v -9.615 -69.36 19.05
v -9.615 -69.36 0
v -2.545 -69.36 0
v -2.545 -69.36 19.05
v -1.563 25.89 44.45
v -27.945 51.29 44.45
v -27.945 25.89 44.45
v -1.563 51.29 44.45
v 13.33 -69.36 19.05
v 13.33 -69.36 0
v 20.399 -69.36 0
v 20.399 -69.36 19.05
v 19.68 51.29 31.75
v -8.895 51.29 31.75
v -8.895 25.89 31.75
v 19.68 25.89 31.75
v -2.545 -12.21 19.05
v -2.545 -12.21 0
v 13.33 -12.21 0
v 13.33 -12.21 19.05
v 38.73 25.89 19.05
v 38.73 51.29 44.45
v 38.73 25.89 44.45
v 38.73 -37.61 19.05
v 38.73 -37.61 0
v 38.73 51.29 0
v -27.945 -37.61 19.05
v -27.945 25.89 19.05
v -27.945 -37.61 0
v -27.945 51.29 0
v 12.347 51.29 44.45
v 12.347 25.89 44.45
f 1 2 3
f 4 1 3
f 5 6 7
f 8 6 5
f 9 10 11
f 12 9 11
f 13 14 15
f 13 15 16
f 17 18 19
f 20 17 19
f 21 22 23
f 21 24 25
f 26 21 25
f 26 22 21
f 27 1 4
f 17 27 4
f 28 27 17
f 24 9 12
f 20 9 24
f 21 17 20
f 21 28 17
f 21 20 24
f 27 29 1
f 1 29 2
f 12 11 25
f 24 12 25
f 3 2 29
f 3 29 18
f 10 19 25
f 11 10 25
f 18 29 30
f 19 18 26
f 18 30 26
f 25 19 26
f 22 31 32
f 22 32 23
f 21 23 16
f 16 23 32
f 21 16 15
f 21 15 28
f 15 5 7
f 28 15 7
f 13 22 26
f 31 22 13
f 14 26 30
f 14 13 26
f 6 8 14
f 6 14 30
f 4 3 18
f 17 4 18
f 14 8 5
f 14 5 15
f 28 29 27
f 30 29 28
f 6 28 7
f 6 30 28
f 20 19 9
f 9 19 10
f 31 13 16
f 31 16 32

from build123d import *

# Parameters (mm, degrees)
F1_DEPTH = 19.05
F3_DEPTH = 25.4


with BuildPart() as f1:
    # F0 (on Top) → F1 (new body)
    with BuildSketch(Plane.XY):
        Polygon((38.729571, 51.290266), (-27.945429, 51.290266), (-27.945429, -37.609734), (-9.614558, -69.359734), (-2.545429, -69.359734), (-2.545429, -12.209734), (13.329571, -12.209734), (13.329571, -69.359734), (20.3987, -69.359734), (38.729571, -37.609734), align=None)
    extrude(amount=F1_DEPTH)

    # F2 (on face) → F3 (join)
    with BuildSketch(Plane(origin=(0, 51.290266, 0), x_dir=(-1, 0, 0), z_dir=(0, 1, 0))):
        Polygon((-38.729571, 44.45), (-38.729571, 19.05), (27.945429, 19.05), (27.945429, 44.45), (1.563081, 44.45), (8.895429, 31.75), (-19.679571, 31.75), (-12.347222, 44.45), align=None)
    extrude(amount=-F3_DEPTH)


solid = f1.part
